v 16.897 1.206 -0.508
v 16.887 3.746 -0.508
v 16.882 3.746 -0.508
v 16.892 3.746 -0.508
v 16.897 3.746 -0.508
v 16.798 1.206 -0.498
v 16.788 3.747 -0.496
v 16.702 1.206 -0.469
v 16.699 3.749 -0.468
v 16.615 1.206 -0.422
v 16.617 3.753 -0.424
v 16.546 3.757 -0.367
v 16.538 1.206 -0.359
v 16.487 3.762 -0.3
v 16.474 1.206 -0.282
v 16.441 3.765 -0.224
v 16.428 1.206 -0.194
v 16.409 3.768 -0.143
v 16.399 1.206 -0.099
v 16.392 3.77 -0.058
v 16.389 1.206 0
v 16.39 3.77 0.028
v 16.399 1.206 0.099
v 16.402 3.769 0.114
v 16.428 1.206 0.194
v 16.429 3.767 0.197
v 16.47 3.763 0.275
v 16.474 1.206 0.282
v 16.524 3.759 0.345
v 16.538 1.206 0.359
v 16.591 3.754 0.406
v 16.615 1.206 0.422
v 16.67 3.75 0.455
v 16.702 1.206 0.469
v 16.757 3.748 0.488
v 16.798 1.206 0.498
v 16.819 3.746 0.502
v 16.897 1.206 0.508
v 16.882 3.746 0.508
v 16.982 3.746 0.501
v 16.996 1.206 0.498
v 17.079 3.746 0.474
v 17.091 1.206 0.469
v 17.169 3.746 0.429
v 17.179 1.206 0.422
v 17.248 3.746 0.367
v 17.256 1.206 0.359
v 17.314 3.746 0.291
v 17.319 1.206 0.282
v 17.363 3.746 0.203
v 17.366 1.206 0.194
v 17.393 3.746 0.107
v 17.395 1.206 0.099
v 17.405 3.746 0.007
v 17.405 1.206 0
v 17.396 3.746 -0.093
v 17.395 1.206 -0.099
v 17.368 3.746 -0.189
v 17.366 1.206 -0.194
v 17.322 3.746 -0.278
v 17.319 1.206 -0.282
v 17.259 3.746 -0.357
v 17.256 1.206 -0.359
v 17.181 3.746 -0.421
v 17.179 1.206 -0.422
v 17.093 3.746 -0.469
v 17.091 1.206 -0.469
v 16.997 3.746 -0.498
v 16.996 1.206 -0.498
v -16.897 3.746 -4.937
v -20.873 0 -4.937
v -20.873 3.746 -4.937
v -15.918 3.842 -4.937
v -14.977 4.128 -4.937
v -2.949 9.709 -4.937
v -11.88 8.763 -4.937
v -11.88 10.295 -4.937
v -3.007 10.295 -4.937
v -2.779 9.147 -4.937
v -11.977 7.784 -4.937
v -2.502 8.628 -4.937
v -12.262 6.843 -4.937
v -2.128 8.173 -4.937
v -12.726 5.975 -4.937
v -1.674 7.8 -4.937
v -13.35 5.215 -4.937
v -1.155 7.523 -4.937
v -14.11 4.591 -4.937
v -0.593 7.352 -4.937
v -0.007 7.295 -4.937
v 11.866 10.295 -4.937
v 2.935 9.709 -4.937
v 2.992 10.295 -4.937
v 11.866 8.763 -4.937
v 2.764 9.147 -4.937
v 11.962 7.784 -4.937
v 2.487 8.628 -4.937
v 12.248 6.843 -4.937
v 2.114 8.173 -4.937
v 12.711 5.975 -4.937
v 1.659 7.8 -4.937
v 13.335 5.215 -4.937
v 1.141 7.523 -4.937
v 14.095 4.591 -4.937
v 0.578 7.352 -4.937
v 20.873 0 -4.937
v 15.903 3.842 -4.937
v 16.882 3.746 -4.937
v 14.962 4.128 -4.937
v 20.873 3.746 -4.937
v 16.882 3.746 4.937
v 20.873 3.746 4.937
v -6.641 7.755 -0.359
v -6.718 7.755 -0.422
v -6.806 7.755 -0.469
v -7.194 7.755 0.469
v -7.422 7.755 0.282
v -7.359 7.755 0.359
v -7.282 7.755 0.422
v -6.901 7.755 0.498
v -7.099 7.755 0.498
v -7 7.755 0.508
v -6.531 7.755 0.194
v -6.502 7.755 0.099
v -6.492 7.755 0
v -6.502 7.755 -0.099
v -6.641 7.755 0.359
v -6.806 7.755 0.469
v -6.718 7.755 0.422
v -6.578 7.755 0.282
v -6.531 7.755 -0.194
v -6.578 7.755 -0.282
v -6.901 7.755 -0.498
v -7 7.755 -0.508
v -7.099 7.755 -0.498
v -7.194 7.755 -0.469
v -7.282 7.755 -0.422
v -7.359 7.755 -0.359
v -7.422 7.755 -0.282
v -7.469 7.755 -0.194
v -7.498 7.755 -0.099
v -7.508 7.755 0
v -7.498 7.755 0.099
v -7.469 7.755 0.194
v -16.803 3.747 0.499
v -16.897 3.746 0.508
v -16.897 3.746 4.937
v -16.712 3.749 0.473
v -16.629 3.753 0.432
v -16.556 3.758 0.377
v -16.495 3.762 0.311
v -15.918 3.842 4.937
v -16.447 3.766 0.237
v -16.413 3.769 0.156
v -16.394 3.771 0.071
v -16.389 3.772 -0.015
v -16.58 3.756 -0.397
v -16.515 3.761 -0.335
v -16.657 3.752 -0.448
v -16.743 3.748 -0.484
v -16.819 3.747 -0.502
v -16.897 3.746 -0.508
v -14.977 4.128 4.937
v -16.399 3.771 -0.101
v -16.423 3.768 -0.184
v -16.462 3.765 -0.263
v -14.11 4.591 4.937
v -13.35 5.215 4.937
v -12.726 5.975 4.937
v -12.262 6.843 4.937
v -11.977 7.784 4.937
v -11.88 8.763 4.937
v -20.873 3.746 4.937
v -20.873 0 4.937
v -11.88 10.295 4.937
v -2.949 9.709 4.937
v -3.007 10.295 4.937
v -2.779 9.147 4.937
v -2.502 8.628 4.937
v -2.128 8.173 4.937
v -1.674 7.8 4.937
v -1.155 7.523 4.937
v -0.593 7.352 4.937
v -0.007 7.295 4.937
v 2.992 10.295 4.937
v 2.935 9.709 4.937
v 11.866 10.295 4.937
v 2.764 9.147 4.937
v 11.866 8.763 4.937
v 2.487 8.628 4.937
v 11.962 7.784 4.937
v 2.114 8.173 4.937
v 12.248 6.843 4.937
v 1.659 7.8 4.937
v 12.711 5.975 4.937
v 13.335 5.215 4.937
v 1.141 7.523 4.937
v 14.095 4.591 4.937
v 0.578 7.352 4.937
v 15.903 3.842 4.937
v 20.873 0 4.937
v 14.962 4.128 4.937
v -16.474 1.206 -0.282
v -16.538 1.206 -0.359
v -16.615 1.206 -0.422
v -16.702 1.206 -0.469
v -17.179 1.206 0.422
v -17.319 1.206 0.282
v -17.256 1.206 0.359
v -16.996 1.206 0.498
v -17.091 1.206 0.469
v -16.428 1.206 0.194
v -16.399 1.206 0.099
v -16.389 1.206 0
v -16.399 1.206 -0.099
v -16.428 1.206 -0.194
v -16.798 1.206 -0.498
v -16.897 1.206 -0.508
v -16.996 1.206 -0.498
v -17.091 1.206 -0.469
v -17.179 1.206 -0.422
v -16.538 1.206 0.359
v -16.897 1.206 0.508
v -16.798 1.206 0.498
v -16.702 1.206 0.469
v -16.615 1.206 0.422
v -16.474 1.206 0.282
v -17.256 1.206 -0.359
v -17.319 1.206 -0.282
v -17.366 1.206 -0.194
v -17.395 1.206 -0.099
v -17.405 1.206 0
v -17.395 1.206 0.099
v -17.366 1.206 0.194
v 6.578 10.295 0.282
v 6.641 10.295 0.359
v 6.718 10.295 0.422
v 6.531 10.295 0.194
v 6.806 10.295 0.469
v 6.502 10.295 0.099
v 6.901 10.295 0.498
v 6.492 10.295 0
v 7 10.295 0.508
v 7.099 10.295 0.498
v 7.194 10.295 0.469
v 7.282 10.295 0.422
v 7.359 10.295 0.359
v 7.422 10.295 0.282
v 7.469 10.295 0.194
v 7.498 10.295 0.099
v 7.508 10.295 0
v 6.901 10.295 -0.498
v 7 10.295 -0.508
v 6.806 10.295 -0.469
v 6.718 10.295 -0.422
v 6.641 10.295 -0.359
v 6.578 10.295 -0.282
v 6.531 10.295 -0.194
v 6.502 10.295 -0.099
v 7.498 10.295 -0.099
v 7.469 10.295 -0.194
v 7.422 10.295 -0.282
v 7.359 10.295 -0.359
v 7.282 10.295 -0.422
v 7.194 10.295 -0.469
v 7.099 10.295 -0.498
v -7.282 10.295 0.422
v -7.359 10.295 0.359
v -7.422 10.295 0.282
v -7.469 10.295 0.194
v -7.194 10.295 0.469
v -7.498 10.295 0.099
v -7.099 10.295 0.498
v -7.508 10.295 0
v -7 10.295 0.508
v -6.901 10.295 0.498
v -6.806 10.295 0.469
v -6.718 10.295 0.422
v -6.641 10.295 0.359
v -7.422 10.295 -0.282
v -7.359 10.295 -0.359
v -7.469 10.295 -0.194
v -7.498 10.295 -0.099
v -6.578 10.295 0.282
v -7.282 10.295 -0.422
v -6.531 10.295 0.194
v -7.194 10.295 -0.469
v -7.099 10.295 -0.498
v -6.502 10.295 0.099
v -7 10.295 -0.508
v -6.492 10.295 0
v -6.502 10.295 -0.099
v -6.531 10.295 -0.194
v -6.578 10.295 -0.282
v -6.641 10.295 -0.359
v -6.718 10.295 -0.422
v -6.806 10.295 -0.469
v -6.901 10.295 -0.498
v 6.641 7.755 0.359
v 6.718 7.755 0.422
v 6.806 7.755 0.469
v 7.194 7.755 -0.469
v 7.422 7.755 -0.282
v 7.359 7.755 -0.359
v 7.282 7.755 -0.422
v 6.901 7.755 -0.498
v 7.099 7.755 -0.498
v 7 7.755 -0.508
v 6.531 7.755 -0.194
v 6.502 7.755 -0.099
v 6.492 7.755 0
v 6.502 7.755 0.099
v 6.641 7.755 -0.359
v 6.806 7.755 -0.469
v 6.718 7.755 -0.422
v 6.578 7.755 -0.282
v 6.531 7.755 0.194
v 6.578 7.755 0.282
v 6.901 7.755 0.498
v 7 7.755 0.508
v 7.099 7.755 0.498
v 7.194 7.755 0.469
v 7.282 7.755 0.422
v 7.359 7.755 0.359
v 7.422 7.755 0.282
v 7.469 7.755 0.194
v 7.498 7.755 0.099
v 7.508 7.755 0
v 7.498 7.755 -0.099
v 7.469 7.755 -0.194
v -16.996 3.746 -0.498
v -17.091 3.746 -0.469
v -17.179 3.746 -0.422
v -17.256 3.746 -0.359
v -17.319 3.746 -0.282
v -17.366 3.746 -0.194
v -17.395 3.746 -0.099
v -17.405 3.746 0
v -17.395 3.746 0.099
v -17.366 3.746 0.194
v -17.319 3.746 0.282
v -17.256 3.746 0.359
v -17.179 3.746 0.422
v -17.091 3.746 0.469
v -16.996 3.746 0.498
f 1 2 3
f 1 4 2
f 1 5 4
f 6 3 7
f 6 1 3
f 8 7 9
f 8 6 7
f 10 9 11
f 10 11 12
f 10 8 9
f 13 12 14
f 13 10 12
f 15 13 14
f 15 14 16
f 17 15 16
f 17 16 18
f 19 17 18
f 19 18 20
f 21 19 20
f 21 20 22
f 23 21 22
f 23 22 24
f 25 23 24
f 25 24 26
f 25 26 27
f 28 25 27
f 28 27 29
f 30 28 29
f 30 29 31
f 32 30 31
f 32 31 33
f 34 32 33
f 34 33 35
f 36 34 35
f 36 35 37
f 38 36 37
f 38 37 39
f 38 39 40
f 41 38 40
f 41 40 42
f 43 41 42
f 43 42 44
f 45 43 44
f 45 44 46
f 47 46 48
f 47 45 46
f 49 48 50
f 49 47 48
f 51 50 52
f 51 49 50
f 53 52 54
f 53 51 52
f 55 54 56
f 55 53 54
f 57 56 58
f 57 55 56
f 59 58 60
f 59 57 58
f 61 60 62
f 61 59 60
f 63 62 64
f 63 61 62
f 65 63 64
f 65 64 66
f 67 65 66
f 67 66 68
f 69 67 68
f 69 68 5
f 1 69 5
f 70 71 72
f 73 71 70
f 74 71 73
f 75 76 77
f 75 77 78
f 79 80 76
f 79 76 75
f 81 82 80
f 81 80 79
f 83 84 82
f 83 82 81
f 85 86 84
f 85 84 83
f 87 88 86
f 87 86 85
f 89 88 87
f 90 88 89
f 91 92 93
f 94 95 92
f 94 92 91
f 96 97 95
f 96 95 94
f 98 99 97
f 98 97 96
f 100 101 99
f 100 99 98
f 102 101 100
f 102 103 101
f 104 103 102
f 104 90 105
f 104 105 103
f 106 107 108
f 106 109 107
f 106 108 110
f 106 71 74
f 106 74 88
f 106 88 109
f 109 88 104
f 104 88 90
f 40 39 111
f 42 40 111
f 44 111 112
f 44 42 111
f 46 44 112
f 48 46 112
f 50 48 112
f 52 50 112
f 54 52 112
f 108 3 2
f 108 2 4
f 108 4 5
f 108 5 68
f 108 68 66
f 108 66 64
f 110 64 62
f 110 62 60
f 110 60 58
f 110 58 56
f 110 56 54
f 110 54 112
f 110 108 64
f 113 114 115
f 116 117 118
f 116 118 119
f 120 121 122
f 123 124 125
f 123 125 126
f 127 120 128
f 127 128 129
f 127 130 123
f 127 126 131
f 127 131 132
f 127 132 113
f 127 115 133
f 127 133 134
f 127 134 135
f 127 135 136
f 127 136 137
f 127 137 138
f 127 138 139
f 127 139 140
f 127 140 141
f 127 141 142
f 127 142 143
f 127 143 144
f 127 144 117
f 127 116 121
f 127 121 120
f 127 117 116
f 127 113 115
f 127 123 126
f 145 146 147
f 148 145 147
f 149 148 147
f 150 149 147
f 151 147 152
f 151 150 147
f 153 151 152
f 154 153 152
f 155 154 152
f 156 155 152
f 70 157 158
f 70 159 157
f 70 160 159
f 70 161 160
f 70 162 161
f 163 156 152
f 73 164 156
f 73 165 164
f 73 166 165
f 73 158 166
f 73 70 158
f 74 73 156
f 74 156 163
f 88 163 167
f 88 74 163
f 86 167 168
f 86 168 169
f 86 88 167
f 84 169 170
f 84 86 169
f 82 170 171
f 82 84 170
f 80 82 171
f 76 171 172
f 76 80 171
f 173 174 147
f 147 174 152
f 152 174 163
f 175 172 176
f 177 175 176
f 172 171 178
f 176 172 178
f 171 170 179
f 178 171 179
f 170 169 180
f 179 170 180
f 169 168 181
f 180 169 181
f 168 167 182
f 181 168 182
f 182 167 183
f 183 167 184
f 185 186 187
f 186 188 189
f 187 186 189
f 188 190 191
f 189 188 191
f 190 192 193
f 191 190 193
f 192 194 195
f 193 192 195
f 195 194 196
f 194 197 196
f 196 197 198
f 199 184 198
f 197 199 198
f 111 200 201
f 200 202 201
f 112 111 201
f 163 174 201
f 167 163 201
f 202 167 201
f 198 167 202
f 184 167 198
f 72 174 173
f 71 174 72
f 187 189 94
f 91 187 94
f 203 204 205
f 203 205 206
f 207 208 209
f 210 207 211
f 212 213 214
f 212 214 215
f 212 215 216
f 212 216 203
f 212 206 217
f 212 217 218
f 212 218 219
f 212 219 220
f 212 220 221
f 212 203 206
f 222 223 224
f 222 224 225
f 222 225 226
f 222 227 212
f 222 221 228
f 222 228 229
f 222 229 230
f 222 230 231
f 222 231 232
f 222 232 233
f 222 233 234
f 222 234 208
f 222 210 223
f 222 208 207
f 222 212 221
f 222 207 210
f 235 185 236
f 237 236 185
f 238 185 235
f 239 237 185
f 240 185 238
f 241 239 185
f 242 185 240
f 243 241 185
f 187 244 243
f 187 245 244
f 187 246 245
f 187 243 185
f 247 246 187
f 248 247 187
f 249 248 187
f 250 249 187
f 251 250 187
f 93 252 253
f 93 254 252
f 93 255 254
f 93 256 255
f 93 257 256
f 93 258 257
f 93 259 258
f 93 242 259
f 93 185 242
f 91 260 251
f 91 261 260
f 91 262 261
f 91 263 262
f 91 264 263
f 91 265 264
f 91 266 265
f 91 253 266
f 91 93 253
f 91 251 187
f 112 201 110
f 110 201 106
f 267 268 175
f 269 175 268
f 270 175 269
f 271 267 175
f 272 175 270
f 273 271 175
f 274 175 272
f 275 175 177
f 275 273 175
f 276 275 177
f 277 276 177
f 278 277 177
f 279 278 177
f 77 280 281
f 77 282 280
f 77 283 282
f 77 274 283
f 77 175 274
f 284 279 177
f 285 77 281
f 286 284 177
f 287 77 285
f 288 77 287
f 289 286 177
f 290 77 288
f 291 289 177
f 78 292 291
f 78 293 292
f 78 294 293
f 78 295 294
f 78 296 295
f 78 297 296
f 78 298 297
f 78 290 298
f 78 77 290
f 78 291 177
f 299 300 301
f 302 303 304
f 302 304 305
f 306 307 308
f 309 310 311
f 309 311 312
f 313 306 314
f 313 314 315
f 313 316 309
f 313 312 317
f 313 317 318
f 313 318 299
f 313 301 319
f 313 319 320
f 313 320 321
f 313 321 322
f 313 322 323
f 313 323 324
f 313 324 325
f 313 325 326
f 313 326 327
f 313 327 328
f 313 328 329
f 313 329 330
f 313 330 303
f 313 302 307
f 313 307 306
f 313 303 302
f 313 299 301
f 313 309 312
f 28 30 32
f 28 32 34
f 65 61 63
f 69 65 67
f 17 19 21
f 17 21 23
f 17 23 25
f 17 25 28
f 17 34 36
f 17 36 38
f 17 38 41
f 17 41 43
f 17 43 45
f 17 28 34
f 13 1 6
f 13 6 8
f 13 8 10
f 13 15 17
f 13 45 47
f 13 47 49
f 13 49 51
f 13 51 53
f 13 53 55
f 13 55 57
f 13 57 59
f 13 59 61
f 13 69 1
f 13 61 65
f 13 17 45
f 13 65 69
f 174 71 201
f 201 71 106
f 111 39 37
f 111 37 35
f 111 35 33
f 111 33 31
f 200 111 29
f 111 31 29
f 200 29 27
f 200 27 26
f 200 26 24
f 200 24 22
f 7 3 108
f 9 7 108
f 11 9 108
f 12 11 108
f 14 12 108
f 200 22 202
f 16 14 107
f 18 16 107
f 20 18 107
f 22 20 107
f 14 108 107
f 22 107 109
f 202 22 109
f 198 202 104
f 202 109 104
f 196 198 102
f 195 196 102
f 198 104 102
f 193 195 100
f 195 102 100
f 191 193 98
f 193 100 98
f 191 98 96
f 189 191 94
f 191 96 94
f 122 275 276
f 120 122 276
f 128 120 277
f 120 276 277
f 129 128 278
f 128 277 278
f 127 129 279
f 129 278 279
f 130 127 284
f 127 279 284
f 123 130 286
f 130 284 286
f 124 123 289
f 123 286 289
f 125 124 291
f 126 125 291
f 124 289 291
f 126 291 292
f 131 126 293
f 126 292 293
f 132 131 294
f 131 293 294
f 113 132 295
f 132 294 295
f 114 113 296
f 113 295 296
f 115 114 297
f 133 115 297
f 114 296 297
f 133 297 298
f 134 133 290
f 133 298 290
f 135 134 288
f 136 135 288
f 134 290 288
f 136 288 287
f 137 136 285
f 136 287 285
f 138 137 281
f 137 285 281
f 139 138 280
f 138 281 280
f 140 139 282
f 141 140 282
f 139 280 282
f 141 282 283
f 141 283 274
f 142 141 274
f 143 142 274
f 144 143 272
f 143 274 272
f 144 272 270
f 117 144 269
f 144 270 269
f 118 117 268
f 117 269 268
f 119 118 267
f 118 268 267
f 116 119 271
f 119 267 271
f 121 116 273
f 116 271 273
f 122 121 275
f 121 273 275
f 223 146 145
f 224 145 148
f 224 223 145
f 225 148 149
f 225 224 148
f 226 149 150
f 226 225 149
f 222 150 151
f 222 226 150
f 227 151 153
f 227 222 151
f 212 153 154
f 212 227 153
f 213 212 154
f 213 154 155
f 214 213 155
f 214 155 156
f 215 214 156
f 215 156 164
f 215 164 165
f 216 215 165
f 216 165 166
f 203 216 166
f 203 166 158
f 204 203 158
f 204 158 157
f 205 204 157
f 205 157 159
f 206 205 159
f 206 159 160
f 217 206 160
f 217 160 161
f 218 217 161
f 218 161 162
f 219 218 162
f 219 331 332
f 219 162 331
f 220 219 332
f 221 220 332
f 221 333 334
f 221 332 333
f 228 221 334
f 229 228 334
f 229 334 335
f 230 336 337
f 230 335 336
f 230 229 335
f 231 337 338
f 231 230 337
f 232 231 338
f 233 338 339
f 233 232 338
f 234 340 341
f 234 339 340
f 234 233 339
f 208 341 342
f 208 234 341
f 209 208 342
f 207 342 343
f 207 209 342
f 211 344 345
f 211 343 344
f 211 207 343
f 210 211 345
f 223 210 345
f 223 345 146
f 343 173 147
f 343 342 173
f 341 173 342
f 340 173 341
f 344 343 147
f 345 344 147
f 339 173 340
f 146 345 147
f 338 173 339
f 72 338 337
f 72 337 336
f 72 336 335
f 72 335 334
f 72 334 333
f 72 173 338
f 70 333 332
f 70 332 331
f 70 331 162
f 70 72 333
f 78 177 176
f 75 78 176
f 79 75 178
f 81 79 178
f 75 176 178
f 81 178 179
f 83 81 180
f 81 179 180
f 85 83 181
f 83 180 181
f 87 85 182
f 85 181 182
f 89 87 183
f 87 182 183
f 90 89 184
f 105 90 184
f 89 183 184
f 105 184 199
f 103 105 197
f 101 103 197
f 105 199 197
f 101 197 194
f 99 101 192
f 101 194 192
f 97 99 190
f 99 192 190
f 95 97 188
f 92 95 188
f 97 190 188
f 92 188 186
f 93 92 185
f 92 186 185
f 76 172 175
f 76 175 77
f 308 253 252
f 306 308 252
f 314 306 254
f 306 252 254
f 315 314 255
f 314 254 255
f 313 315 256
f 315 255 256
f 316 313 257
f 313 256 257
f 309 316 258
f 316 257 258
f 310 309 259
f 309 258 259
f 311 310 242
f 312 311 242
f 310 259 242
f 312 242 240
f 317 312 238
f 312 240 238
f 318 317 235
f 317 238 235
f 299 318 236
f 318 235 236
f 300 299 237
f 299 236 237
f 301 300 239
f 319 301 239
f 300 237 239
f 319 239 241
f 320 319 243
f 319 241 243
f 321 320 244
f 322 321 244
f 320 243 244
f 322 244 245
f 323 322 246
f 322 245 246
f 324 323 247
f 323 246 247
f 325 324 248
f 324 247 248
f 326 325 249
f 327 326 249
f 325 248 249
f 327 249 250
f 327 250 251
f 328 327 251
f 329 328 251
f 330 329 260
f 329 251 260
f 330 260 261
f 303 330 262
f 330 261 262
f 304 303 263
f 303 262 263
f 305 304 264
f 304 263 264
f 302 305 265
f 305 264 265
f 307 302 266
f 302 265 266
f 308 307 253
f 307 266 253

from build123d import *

# Parameters (mm, degrees)
SKETCH2_W               = 41.746000074
SKETCH2_H               = 9.873000066
BOSS_EXTRUDE1_DEPTH     = 3.746000128
SKETCH3_W               = 23.746000006
SKETCH3_H               = 9.873000066
BOSS_EXTRUDE2_DEPTH     = 6.548499984
FILLET1_R               = 5.0165
SKETCH4_R               = 2.99974
CUT_EXTRUDE1_DEPTH      = 26.281119307
CUT_EXTRUDE2_DEPTH      = 23.426190384
CUT_EXTRUDE2_DEPTH_BACK = 2.54
SKETCH6_R               = 0.508
SKETCH7_R               = 0.508
CUT_EXTRUDE3_DEPTH      = 2.54


with BuildPart() as part:
    # Sketch2 → Boss-Extrude1 (new body)
    with BuildSketch(Plane(origin=(0, 0, 0), x_dir=(1, 0, 0), z_dir=(0, 1, 0))):
        Rectangle(SKETCH2_W, SKETCH2_H)
    extrude(amount=BOSS_EXTRUDE1_DEPTH)

    # Sketch3 → Boss-Extrude2 (add)
    with BuildSketch(Plane(origin=(0, 3.746000128, 0), x_dir=(1, 0, 0), z_dir=(0, 1, 0))):
        with Locations((-0.00733485, 0)):
            Rectangle(SKETCH3_W, SKETCH3_H)
    extrude(amount=BOSS_EXTRUDE2_DEPTH)

    # Fillet1
    fillet1_edges = [part.edges().sort_by_distance(p)[0] for p in [
        (-11.880334853, 3.746000128, 0),
        (11.865665153, 3.746000128, 0),
    ]]
    fillet(fillet1_edges, radius=FILLET1_R)

    # Sketch4 → Cut-Extrude1 (cut, through all)
    with BuildSketch(Plane.XY.offset(4.936500033)):
        with Locations((-0.00733485, 10.294500112)):
            Circle(SKETCH4_R)
    extrude(amount=-CUT_EXTRUDE1_DEPTH, mode=Mode.SUBTRACT)

    # Sketch6 → Cut-Extrude2 (cut, two sides: drawn at the far end of the back side and taken through both)
    with BuildSketch(Plane(origin=(0, 3.746000128, 0), x_dir=(1, 0, 0), z_dir=(0, 1, 0)).offset(-CUT_EXTRUDE2_DEPTH_BACK)):
        with Locations(Location((-16.896834853, 0, 0), (0, 0, 270))):
            Circle(SKETCH6_R)
        with Locations(Location((16.896834853, 0, 0), (0, 0, 90))):
            Circle(SKETCH6_R)
    extrude(amount=CUT_EXTRUDE2_DEPTH + CUT_EXTRUDE2_DEPTH_BACK, mode=Mode.SUBTRACT)

    # Sketch7 → Cut-Extrude3 (cut)
    with BuildSketch(Plane(origin=(0, 10.294500112, 0), x_dir=(1, 0, 0), z_dir=(0, 1, 0))):
        with Locations(Location((-6.99999997, 0, 0), (0, 0, 270))):
            Circle(SKETCH7_R)
        with Locations(Location((6.99999997, 0, 0), (0, 0, 90))):
            Circle(SKETCH7_R)
    extrude(amount=-CUT_EXTRUDE3_DEPTH, mode=Mode.SUBTRACT)


solid = part.part
